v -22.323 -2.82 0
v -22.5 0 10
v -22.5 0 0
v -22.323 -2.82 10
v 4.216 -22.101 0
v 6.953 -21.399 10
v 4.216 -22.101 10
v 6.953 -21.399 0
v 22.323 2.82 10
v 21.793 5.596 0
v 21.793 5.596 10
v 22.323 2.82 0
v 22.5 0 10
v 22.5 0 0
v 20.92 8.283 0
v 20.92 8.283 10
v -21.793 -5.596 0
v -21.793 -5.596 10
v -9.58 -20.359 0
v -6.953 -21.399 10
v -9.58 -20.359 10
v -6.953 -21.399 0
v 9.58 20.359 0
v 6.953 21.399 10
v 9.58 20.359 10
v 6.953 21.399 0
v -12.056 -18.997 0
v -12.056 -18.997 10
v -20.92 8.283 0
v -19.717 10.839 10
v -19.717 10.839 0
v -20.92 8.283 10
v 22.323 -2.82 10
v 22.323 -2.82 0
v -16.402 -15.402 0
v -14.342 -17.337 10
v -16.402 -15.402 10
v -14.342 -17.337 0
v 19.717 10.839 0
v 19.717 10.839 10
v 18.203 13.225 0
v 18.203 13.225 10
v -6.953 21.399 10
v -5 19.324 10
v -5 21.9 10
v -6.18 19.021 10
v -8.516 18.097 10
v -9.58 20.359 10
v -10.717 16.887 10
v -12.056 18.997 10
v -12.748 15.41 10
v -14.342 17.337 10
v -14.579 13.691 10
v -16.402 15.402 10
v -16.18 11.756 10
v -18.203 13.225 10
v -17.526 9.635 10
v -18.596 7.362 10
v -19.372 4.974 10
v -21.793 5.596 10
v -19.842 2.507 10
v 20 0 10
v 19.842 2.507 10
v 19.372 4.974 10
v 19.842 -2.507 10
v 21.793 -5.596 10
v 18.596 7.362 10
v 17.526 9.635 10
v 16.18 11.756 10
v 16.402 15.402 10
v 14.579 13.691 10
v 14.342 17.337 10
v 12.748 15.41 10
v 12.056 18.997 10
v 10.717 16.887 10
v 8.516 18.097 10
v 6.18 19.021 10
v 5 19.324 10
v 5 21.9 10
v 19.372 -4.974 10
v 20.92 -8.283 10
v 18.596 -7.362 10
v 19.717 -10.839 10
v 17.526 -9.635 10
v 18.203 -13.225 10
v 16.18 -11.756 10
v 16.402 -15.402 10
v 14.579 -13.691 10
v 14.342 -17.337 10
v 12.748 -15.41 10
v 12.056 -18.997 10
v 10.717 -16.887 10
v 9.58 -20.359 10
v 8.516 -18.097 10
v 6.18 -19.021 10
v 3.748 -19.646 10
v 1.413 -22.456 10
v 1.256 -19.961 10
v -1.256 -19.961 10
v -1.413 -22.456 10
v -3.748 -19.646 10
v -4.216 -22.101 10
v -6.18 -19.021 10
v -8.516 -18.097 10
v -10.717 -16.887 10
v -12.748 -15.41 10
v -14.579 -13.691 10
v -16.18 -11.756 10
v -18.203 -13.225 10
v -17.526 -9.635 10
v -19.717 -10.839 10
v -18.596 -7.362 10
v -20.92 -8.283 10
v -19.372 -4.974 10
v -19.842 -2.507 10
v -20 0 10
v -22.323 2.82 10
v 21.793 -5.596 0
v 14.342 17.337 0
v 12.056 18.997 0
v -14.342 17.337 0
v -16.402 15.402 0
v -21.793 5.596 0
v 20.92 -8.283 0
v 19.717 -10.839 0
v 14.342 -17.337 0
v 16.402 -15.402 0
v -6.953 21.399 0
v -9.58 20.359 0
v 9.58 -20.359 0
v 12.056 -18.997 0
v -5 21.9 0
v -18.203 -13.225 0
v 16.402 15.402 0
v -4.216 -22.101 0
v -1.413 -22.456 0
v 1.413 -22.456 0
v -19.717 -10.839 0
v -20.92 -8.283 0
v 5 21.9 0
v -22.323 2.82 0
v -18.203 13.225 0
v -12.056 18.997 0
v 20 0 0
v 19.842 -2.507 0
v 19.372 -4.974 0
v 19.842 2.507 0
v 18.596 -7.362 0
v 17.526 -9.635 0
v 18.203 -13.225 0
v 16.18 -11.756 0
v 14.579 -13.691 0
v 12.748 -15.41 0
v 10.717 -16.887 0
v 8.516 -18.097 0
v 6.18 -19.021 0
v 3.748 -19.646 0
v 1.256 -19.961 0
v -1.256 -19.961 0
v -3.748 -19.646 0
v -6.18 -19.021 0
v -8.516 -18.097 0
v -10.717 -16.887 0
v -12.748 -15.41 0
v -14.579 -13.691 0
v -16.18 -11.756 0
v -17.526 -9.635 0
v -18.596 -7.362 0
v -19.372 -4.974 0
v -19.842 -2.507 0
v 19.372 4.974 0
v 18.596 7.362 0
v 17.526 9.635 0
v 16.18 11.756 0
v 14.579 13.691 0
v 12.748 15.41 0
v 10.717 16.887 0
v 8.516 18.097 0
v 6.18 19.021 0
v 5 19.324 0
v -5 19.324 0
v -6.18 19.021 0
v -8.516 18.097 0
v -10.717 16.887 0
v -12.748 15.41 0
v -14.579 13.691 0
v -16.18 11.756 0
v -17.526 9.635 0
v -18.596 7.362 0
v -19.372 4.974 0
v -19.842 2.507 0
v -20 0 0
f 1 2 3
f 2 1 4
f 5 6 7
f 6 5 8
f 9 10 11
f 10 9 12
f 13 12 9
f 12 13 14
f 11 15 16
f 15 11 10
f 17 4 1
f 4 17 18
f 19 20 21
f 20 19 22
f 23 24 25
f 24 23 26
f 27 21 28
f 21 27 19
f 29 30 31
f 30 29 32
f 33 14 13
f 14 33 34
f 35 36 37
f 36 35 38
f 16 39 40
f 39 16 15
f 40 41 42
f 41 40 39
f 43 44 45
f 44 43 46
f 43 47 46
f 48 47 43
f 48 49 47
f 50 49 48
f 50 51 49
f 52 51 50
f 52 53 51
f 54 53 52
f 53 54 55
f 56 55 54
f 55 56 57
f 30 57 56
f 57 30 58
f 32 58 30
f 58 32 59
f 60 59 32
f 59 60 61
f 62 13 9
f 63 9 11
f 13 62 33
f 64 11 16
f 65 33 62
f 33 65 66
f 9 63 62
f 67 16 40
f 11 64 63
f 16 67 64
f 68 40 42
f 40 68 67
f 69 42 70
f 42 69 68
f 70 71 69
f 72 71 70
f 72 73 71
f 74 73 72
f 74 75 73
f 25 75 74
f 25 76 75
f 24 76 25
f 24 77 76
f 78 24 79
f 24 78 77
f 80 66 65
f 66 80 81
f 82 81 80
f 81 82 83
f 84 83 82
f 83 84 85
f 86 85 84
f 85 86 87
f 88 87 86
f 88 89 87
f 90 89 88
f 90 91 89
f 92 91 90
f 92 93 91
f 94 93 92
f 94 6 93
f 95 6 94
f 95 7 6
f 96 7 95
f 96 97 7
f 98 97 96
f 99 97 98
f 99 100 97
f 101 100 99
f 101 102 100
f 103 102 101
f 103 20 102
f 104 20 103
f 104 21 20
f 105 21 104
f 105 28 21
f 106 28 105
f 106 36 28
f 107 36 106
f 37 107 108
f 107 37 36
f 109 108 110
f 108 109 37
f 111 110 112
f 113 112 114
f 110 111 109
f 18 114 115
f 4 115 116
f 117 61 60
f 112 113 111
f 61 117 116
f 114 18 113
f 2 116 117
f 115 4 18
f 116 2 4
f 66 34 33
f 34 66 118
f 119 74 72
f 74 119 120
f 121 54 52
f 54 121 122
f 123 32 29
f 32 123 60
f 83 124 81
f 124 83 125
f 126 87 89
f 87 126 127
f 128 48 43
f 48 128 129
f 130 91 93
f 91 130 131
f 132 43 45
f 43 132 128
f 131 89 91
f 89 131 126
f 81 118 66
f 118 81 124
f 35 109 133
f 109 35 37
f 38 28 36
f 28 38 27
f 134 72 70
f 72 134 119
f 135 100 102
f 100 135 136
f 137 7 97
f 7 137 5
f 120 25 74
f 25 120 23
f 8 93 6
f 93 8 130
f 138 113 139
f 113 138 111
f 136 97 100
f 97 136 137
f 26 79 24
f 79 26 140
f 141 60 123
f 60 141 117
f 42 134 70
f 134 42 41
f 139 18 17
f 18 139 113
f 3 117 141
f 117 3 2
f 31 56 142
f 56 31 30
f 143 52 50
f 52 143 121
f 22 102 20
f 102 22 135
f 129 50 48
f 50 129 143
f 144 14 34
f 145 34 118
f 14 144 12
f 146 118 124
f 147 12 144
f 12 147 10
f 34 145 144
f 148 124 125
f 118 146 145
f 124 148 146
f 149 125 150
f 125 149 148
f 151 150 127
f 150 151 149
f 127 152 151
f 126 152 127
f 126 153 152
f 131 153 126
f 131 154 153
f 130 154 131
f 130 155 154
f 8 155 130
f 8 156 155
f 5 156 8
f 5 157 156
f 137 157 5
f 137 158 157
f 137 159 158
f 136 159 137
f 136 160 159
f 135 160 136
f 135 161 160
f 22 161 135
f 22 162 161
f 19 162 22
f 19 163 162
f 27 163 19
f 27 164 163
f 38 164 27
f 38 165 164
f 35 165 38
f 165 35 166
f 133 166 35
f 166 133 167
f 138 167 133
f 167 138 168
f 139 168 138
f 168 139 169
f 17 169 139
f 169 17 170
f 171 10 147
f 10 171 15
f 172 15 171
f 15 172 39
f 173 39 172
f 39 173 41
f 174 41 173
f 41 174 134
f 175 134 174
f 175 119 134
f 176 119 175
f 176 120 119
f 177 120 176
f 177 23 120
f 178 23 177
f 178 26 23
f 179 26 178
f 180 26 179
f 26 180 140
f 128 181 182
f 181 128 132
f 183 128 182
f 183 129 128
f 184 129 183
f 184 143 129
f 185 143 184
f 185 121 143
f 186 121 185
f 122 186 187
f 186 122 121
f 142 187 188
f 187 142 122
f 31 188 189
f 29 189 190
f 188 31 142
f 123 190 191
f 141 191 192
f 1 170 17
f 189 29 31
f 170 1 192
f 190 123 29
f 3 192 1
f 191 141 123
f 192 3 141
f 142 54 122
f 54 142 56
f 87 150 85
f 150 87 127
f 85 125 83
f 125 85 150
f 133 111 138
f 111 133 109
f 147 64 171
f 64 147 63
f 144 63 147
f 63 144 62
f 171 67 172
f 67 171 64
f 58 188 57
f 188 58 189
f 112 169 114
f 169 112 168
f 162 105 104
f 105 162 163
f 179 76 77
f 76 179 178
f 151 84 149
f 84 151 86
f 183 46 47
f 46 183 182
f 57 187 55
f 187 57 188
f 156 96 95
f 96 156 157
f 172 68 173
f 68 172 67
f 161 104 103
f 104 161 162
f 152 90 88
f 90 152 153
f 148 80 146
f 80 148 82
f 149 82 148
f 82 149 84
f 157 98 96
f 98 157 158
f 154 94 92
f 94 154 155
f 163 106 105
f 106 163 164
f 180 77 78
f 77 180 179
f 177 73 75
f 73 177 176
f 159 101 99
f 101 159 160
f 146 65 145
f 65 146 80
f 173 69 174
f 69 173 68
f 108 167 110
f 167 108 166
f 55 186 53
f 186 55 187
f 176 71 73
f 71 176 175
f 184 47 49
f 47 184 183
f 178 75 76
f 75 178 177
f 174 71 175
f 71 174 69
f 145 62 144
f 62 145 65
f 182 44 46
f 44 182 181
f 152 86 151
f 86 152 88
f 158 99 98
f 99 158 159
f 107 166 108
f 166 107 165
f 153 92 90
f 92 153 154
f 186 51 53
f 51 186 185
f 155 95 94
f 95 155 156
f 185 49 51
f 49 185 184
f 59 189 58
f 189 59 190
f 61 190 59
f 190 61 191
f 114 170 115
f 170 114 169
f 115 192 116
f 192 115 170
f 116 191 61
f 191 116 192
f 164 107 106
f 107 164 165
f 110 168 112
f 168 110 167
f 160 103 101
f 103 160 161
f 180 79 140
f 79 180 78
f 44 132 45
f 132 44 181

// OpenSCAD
$fn = 50;
//Diameter of legs
$inner_diameter = 40;
//Outer Diameter
$outer_diameter = 45;
//Ring Height
$h = 10;
difference(){
    cylinder($h, d=$outer_diameter, true);
    cylinder($h, d=$inner_diameter, true);
    translate([-5,15,0]){
        cube([10,10,10]);
    }
}
